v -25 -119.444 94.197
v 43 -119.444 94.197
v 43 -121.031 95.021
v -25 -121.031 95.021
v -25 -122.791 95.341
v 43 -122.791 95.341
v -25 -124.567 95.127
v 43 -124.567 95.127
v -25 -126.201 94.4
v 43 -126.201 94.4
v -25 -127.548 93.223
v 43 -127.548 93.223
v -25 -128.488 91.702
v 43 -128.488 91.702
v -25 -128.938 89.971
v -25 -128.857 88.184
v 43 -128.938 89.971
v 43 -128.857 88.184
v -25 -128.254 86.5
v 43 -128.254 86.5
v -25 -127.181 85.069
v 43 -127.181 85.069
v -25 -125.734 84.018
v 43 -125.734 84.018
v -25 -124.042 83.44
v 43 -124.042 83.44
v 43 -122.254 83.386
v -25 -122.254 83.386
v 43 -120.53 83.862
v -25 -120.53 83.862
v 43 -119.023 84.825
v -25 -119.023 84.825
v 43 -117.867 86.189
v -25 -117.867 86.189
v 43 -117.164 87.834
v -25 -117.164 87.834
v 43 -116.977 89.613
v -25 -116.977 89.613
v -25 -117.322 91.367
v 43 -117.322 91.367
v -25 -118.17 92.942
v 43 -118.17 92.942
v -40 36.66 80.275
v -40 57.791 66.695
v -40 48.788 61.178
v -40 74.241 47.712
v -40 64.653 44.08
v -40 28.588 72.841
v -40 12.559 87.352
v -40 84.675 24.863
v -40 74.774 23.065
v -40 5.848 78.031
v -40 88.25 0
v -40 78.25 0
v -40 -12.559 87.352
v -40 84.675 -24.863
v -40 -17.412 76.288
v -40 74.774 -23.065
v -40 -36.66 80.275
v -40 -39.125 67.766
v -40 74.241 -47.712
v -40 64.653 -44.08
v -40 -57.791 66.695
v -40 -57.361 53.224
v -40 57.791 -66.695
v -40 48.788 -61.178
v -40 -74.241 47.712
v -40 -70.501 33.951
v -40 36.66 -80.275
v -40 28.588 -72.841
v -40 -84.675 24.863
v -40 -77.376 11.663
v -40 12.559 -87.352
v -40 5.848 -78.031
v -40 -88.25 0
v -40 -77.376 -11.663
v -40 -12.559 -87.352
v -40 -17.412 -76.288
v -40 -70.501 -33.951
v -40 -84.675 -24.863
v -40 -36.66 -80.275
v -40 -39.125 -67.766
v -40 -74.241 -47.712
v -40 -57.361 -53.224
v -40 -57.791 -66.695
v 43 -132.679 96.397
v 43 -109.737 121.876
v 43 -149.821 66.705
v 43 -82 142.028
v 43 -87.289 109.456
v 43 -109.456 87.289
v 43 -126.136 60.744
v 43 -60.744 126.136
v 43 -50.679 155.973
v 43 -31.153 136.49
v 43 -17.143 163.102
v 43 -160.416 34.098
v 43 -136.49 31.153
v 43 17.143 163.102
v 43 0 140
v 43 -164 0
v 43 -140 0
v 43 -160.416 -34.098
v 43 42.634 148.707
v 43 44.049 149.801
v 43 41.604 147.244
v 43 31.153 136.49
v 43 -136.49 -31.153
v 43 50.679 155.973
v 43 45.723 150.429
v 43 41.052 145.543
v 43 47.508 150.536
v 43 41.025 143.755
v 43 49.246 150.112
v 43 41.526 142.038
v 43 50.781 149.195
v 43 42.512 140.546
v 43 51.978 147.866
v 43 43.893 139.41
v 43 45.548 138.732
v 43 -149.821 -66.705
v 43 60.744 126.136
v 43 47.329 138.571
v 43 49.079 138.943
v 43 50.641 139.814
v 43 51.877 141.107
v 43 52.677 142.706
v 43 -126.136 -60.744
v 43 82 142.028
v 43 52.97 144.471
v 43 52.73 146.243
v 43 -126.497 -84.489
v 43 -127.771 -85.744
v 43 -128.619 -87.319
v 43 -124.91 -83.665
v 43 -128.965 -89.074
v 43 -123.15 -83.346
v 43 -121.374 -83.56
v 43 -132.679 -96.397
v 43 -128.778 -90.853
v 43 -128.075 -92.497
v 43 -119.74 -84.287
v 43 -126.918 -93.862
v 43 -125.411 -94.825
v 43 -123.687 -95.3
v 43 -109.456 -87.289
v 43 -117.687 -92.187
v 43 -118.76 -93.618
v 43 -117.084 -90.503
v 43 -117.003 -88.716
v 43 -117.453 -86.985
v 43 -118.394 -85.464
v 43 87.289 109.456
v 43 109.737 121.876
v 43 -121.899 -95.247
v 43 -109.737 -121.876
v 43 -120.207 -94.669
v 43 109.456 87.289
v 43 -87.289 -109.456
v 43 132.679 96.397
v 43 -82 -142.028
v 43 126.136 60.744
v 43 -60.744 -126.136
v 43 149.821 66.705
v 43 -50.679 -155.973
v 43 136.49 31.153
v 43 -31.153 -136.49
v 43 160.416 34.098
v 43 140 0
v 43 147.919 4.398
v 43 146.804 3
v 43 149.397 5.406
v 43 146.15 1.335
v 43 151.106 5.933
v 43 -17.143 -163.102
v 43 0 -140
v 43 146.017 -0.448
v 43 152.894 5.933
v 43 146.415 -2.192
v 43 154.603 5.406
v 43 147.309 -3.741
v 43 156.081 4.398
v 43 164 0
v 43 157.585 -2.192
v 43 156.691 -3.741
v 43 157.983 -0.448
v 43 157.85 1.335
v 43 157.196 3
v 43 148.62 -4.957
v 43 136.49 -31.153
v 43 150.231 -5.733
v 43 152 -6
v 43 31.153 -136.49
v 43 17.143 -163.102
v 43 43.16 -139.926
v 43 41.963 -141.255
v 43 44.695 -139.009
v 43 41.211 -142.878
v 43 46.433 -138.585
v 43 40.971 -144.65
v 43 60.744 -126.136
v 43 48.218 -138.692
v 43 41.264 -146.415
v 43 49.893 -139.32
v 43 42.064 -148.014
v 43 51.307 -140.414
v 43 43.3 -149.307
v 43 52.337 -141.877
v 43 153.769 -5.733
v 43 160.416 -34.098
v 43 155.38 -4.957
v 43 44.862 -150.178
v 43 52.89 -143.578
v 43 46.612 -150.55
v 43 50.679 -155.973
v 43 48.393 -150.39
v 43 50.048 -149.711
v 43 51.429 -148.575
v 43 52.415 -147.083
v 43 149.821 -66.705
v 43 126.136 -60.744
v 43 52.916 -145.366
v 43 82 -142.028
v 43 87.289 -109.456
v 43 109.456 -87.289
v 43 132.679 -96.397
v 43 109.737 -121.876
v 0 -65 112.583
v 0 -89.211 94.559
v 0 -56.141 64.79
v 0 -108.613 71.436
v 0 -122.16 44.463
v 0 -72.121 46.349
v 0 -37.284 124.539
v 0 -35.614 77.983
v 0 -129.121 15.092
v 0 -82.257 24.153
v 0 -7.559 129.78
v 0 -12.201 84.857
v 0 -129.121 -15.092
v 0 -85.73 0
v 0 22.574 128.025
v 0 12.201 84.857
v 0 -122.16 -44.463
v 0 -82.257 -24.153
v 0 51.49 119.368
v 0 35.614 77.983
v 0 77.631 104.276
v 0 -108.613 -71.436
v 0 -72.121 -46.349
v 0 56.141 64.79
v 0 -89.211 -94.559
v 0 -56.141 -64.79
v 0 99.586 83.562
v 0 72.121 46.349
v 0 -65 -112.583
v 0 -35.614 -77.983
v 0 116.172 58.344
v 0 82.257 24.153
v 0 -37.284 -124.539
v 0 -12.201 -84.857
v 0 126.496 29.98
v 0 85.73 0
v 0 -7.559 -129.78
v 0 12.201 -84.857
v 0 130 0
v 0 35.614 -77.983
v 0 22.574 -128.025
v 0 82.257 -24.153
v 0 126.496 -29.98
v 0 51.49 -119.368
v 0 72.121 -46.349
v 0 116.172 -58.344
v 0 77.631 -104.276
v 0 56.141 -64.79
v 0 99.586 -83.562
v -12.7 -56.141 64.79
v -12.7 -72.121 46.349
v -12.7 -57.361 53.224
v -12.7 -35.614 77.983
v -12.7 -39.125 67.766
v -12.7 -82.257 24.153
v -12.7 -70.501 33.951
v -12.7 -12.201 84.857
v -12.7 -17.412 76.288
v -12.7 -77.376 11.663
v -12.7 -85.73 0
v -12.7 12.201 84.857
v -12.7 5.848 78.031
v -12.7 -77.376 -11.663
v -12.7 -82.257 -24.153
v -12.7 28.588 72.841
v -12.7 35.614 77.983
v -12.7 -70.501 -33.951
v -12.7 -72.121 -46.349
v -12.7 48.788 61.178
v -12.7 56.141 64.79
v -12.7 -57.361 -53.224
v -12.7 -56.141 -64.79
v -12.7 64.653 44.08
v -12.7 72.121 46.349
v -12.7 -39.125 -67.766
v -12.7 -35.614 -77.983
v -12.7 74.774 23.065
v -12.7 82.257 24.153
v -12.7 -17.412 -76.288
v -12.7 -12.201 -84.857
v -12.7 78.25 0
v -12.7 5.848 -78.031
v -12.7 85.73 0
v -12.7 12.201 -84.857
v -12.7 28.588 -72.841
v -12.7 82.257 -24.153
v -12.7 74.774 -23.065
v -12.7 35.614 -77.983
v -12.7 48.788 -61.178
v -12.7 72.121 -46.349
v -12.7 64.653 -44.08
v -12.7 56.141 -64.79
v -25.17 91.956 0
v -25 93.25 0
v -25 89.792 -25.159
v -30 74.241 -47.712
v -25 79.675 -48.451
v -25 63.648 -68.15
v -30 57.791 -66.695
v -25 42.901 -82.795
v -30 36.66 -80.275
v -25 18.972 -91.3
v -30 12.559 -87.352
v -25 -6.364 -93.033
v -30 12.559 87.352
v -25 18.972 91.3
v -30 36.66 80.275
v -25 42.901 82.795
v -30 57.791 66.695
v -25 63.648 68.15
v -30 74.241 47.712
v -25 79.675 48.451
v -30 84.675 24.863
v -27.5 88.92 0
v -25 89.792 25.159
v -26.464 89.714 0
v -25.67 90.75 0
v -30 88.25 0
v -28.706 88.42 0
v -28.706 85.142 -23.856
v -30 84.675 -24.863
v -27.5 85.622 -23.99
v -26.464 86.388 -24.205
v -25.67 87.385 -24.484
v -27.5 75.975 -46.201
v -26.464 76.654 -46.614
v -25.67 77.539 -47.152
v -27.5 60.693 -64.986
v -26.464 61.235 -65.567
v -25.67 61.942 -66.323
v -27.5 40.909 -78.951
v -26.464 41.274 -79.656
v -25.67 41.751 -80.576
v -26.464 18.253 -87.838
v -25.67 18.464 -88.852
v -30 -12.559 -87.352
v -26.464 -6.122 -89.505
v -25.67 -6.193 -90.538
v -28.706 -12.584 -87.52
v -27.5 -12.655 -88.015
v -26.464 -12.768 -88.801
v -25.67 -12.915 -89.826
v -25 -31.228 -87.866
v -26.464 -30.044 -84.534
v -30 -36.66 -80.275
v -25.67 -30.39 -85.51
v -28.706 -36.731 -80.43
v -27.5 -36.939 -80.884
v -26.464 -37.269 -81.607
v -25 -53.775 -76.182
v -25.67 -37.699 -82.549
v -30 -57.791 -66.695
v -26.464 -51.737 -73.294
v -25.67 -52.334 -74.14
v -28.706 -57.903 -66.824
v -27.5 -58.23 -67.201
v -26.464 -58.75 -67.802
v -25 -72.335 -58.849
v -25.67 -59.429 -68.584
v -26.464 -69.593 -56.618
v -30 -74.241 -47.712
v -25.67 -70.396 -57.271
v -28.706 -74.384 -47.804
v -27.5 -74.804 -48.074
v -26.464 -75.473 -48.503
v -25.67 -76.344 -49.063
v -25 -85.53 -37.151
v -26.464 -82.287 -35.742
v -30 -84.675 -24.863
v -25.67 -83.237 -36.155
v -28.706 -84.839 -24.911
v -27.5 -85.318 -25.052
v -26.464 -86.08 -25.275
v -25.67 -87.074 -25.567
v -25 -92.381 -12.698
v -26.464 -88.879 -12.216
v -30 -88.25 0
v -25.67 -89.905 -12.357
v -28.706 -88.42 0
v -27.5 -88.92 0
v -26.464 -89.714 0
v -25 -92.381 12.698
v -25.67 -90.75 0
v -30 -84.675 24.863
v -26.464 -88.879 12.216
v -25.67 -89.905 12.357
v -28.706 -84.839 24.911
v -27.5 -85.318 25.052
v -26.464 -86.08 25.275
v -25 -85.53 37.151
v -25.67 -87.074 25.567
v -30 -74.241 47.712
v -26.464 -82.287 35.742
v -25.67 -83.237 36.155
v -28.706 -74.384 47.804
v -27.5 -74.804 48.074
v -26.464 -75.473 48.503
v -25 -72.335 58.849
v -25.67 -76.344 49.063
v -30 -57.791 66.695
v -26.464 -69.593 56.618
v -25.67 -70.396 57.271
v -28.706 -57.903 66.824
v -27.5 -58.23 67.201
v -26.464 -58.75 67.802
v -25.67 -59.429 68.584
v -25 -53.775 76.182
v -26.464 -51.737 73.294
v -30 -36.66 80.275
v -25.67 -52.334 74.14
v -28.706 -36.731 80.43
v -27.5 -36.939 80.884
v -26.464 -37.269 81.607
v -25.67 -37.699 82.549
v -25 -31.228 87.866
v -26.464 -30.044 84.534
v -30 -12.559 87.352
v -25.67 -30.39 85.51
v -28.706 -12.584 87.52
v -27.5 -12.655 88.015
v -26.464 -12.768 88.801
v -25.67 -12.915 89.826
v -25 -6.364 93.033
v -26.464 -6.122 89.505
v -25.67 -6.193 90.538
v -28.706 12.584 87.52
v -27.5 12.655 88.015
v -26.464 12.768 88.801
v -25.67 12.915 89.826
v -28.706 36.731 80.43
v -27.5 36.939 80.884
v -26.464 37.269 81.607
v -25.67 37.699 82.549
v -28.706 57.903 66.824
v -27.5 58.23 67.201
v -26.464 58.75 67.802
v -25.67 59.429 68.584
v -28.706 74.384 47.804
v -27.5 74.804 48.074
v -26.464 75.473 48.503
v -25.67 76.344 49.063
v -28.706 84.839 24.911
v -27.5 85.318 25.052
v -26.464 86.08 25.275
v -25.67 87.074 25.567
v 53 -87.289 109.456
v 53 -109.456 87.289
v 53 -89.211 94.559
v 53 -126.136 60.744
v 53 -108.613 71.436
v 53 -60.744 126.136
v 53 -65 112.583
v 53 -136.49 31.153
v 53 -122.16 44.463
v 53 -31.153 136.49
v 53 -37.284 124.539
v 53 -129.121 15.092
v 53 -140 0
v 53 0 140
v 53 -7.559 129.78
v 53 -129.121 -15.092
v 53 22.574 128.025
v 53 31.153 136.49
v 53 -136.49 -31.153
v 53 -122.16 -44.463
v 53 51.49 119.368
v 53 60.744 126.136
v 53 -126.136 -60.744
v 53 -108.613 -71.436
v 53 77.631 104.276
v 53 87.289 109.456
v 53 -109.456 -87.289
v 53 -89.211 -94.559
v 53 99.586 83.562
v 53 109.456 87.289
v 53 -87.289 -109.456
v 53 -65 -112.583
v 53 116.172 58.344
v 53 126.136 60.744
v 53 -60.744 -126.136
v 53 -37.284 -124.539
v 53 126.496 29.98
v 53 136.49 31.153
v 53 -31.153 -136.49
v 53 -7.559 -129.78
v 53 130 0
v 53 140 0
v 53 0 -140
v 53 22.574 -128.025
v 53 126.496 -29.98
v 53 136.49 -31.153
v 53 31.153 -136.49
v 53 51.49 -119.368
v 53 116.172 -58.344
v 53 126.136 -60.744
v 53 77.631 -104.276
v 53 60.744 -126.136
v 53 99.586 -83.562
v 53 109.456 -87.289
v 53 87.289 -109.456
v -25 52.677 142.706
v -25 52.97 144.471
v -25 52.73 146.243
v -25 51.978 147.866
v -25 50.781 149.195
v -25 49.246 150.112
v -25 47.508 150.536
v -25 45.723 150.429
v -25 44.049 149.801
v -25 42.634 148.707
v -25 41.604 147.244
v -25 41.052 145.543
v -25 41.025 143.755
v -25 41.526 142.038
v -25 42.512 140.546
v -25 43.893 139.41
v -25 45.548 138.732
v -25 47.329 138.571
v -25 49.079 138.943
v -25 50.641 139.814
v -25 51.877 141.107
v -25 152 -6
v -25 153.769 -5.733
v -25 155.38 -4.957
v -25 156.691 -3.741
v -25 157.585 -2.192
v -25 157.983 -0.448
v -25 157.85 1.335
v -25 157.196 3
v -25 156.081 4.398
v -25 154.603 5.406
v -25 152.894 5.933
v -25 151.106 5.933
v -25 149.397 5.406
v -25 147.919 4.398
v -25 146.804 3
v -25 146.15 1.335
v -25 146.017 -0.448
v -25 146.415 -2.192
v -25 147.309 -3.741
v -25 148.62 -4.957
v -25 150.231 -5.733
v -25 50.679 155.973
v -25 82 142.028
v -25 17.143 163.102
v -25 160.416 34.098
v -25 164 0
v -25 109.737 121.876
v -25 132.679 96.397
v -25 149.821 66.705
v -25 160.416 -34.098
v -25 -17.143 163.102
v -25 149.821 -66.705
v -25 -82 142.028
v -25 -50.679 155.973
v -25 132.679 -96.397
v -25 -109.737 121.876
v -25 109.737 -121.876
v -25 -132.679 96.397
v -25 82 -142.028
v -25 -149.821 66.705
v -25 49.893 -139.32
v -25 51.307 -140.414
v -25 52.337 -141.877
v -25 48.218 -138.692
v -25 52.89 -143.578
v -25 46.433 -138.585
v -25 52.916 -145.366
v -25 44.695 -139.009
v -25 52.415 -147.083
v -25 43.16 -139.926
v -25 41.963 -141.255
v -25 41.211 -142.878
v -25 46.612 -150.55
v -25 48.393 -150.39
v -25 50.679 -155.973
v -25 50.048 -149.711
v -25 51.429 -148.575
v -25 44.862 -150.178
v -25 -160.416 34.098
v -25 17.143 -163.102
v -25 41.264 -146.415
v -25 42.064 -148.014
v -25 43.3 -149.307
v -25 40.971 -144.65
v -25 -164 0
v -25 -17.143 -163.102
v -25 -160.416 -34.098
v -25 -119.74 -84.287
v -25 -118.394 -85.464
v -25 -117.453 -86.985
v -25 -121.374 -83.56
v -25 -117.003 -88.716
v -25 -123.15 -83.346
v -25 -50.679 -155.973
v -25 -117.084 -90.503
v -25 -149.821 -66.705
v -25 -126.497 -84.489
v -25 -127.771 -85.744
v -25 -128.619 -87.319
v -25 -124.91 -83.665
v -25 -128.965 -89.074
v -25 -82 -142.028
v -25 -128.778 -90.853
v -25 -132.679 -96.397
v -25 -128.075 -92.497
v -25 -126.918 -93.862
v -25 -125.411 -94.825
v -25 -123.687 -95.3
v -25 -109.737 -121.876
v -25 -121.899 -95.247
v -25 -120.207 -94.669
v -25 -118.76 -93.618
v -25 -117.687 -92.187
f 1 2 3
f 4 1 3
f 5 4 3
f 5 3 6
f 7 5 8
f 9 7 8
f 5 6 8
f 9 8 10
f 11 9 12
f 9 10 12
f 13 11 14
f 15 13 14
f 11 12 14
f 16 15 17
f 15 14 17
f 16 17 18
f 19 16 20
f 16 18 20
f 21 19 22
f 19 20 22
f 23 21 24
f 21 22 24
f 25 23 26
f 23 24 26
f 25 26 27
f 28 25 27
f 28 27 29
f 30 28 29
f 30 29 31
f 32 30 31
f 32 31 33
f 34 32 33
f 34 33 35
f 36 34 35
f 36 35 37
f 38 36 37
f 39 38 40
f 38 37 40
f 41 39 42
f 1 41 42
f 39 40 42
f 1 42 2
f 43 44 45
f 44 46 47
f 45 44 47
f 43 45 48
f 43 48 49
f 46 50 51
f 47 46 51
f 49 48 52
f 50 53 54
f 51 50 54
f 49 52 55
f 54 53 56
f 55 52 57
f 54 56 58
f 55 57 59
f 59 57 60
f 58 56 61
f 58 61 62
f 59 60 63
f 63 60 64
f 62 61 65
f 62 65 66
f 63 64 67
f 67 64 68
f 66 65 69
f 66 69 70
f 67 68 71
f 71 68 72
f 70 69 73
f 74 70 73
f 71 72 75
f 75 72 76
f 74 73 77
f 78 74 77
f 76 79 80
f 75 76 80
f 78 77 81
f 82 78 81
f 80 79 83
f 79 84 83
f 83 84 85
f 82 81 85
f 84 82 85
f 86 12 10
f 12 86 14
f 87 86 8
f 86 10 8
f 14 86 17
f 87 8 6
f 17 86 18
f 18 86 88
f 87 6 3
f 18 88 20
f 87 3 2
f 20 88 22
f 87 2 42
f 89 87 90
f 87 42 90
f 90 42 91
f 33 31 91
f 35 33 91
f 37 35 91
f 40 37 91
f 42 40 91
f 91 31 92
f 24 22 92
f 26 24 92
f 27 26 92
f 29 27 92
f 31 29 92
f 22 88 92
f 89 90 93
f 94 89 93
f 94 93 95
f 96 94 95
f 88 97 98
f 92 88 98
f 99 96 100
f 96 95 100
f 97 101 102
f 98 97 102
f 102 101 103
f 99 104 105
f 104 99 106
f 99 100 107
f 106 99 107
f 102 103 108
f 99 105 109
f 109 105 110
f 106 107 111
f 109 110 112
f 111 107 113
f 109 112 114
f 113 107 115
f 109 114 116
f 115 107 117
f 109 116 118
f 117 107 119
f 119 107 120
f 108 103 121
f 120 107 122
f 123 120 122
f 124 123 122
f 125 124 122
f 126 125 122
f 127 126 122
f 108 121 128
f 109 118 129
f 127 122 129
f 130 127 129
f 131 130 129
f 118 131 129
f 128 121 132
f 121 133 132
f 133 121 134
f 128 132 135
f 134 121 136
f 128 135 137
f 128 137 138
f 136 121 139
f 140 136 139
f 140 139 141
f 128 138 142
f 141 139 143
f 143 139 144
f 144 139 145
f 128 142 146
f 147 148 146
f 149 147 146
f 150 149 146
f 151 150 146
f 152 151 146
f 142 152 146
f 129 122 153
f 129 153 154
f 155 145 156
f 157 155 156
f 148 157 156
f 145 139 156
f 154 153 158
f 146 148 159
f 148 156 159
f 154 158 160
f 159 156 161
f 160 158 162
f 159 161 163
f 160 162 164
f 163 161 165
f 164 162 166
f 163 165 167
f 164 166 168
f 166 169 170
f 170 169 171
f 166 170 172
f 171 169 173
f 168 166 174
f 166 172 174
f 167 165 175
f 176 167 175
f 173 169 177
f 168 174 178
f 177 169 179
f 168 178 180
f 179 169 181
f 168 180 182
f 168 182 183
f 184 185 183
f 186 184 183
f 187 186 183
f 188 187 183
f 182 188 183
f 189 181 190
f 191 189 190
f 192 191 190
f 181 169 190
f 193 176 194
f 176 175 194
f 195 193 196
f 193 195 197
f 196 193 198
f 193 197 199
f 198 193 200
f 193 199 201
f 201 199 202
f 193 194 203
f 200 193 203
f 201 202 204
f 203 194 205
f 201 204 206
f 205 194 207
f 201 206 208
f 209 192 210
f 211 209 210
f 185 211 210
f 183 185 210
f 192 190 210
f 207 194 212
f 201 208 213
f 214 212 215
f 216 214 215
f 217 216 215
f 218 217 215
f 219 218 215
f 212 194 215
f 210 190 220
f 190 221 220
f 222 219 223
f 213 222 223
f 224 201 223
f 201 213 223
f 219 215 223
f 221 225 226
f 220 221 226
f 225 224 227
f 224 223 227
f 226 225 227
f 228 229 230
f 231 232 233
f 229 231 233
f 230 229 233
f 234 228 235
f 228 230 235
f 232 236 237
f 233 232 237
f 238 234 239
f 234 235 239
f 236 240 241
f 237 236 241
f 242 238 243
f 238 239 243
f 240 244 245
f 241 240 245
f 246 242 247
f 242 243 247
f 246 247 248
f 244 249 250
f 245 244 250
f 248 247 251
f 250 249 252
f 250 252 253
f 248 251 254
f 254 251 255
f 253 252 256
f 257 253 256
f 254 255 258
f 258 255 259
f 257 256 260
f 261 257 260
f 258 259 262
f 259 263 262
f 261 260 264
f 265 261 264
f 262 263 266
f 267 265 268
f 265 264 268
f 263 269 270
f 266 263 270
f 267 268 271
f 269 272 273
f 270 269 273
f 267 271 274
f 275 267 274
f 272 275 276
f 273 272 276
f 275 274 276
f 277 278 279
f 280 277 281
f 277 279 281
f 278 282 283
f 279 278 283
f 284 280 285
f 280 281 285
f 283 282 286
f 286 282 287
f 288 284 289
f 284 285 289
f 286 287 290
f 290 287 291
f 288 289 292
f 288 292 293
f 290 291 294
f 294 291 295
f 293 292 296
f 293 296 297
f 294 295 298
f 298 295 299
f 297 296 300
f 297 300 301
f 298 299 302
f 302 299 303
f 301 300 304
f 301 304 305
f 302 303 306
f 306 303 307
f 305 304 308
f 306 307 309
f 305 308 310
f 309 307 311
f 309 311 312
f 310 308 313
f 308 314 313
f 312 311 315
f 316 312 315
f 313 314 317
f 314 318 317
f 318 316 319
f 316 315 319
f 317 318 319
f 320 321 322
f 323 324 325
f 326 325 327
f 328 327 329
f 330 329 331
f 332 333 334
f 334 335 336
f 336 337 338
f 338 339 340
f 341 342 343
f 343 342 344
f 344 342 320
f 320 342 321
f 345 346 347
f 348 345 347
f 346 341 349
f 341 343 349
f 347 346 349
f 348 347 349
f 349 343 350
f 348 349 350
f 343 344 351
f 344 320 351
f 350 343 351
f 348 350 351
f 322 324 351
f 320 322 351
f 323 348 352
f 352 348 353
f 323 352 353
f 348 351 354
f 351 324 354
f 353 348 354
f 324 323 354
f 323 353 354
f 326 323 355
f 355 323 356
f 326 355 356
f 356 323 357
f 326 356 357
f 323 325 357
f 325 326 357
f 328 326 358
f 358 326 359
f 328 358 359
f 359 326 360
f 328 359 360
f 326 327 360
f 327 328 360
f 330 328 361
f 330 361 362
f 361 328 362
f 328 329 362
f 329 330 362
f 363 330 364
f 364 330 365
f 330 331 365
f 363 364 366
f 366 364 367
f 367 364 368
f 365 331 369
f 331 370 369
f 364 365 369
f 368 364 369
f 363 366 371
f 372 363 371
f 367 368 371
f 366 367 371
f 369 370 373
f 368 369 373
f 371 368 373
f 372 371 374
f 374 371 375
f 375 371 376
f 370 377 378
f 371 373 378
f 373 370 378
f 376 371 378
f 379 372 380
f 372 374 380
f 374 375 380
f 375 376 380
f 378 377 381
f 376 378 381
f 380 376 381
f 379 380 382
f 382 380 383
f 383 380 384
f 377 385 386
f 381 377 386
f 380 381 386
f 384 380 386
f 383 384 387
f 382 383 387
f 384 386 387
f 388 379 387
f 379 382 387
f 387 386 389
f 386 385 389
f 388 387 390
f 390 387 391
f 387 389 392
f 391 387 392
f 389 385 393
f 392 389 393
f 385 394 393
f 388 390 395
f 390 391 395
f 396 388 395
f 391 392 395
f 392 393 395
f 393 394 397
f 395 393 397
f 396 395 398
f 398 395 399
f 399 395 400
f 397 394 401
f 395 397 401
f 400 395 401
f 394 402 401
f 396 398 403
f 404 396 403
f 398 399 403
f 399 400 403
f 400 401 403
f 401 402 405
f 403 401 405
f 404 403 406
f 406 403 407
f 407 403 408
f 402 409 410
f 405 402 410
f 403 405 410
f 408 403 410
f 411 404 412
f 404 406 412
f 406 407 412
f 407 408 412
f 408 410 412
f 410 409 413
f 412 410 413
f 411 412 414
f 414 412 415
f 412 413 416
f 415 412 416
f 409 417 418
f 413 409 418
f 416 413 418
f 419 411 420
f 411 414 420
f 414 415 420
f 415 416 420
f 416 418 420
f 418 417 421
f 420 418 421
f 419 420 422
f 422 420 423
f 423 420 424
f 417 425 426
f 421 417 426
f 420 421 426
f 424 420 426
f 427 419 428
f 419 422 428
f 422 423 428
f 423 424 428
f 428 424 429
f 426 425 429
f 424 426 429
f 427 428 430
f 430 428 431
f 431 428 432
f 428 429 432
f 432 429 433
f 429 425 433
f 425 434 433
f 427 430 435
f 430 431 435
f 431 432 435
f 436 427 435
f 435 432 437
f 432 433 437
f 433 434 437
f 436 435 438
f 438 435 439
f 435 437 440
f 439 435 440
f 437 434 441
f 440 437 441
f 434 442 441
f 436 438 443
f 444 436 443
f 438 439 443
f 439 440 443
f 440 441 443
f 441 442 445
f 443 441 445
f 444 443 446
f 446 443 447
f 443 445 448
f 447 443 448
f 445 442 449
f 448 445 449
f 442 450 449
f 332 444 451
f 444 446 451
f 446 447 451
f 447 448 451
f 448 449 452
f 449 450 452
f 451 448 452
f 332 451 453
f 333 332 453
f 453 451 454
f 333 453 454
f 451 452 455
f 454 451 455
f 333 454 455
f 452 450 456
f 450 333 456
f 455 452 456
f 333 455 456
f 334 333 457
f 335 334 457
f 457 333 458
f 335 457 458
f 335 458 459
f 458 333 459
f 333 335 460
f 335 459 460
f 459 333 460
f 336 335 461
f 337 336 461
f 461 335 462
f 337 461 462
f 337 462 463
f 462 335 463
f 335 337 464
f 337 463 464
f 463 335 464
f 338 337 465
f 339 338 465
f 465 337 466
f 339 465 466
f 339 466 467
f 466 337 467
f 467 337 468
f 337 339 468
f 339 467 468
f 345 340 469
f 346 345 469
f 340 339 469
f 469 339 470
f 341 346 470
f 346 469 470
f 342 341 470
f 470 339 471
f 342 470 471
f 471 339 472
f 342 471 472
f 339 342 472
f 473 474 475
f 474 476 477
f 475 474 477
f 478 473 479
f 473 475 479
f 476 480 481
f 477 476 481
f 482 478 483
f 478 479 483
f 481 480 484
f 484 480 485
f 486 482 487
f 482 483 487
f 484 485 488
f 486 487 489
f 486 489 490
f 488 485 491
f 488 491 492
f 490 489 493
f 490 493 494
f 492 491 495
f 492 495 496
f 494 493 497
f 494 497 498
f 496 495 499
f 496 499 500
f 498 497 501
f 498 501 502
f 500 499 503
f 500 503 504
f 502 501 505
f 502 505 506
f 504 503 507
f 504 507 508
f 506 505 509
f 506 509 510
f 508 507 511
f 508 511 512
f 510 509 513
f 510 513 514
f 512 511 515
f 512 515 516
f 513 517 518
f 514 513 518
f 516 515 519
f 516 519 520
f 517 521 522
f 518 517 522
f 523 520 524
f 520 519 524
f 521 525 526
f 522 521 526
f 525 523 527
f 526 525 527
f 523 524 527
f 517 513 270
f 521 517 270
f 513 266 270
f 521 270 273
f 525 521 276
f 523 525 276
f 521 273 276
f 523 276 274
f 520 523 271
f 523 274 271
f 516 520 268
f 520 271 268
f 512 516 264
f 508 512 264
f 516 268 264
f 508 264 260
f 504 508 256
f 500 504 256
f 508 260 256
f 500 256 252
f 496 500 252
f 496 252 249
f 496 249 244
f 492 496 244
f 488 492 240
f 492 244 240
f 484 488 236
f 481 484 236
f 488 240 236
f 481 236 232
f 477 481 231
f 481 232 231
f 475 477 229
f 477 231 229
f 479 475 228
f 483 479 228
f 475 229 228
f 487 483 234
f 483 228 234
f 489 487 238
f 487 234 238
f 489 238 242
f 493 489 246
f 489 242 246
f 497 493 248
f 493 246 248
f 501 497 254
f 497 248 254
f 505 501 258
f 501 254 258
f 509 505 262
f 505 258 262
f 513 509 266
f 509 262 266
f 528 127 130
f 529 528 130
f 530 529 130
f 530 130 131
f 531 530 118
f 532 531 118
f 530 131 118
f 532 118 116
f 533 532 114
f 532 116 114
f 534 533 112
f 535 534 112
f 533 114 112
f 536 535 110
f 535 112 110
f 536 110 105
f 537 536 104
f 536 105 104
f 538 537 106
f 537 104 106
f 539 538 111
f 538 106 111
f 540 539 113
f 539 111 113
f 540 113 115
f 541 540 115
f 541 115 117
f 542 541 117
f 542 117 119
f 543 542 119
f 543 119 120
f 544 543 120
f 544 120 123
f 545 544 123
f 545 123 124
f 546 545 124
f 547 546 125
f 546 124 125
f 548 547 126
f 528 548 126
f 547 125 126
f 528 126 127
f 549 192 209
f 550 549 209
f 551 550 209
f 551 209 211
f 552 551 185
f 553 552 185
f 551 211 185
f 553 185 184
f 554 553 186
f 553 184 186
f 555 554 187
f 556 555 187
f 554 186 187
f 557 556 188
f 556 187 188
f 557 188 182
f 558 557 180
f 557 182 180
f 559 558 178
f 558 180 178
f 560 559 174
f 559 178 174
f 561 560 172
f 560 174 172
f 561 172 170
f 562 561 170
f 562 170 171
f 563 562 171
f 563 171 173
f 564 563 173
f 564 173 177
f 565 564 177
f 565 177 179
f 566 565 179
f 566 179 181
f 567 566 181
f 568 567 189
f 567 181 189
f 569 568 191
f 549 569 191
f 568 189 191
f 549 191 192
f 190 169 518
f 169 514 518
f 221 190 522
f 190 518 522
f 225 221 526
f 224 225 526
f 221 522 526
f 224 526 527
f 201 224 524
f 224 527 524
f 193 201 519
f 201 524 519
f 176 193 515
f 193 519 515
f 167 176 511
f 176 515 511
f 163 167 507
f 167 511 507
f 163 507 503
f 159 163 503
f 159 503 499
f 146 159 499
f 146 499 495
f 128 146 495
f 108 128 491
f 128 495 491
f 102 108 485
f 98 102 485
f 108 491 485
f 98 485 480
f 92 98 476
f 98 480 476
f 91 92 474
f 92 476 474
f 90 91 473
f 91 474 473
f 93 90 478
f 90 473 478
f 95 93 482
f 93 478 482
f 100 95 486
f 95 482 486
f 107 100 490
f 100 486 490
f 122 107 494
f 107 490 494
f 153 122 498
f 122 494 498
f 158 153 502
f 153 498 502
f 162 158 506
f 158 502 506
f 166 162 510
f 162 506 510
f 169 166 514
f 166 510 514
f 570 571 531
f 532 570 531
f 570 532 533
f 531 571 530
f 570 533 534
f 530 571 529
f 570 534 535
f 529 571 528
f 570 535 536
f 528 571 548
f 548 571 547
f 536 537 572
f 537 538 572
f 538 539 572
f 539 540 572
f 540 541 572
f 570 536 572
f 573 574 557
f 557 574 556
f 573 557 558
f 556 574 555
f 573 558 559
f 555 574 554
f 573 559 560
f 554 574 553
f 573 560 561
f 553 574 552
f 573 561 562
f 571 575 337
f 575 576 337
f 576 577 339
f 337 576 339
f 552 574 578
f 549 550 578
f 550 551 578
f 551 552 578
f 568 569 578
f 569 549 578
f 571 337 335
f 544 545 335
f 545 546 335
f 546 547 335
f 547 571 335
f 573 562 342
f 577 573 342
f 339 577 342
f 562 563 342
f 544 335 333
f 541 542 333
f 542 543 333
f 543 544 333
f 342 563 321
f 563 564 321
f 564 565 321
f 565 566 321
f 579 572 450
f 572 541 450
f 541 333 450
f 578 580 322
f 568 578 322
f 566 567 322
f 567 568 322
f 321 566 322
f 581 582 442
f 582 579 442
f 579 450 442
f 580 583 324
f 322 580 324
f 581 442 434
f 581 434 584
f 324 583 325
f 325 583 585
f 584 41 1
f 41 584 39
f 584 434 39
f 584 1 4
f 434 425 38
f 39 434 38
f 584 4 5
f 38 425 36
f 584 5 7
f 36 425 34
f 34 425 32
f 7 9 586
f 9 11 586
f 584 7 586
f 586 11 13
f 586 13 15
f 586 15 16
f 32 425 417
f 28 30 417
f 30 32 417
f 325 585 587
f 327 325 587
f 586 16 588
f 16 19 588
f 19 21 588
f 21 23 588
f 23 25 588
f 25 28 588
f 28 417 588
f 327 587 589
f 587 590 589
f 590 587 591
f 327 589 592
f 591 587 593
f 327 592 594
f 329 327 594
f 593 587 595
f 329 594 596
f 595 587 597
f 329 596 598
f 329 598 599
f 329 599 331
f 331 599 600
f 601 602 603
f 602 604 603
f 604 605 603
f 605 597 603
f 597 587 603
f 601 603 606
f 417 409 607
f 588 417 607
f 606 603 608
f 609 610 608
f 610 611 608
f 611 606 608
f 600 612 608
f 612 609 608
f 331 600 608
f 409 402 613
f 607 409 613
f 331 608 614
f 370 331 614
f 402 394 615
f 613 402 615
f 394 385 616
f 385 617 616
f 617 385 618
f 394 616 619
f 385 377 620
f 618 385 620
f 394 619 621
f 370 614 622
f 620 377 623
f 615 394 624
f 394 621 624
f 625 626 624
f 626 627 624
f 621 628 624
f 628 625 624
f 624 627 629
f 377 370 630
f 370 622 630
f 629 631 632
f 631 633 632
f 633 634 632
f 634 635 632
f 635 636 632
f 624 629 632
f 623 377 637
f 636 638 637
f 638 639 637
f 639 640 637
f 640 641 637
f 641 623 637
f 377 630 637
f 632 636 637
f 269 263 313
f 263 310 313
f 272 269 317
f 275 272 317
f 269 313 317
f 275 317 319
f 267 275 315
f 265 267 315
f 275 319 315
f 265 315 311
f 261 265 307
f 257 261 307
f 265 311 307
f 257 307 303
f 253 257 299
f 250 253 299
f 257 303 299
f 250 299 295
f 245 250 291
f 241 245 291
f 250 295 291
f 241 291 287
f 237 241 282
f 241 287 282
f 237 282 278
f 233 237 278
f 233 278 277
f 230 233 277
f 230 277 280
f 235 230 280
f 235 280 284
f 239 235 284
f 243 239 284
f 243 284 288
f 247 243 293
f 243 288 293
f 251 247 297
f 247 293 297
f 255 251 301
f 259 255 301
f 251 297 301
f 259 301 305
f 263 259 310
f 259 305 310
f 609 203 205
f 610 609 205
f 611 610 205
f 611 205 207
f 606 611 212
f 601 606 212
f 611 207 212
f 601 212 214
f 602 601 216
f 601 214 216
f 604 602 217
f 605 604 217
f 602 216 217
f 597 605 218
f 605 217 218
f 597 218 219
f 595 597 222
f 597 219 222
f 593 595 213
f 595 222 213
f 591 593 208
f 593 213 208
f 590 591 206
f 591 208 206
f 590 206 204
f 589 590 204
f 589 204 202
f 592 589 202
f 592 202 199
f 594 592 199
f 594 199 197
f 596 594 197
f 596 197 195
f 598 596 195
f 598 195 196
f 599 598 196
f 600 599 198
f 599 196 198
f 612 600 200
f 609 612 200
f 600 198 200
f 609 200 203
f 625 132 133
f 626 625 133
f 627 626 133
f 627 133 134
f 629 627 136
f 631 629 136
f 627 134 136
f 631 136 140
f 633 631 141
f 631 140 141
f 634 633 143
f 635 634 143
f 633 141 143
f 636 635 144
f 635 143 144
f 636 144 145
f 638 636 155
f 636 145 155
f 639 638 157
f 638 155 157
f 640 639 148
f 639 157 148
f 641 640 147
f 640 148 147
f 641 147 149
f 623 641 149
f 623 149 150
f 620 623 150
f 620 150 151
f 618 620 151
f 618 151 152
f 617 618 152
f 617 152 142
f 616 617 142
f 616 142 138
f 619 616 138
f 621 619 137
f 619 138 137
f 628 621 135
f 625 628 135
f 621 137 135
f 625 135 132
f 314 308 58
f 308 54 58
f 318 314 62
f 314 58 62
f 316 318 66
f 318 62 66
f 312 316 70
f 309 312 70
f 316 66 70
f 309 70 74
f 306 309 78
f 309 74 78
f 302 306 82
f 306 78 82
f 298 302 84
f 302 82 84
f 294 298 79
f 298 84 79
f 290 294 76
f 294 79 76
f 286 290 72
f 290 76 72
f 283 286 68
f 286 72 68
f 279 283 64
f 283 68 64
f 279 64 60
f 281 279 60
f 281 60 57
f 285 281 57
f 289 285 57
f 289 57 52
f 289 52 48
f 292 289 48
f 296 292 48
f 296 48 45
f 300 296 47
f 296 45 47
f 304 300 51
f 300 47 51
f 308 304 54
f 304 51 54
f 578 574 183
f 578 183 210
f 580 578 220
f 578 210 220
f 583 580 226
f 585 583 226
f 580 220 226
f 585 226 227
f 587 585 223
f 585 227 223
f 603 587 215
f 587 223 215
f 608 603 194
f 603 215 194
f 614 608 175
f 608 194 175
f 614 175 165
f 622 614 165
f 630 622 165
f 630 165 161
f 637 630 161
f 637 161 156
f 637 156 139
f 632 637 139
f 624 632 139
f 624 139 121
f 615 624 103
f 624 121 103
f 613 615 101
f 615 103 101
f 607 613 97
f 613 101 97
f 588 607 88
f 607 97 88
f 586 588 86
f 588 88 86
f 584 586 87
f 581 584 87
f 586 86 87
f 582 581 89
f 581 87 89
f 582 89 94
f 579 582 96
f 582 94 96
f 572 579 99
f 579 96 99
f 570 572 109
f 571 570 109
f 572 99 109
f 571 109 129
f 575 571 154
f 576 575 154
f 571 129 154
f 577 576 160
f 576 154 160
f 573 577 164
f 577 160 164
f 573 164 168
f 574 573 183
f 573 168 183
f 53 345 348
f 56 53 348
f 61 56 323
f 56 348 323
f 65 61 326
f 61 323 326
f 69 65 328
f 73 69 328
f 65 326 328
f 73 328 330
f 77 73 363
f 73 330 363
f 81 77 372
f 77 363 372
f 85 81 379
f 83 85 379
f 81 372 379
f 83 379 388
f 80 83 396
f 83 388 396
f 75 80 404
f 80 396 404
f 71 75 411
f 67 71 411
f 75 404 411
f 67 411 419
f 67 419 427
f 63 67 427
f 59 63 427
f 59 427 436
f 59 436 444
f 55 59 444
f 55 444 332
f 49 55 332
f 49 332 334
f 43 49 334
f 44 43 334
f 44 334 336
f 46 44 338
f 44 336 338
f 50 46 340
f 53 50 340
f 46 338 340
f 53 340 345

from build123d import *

# Parameters (mm, degrees)
FILLET3_R          = 5
SKETCH2_R          = 6
CUT_EXTRUDE1_DEPTH = 68
CIRPATTERN1_COUNT  = 5


with BuildPart() as part:
    # Sketch1 → Revolve1 (revolve)
    with BuildSketch(Plane.XY):
        Polygon((0, 130), (0, 85.73), (-12.7, 85.73), (-12.7, 78.25), (-40, 78.25), (-40, 88.25), (-25, 88.25), (-25, 164), (43, 164), (43, 140), (53, 140), (53, 130), align=None)
    revolve(axis=Axis((100.288511214, 0, 0), (-1, 0, 0)))

    # Fillet3
    fillet3_edges = [part.edges().sort_by_distance(p)[0] for p in [
        (-25, -88.25, 0),
    ]]
    fillet(fillet3_edges, radius=FILLET3_R)

    # Sketch2 → Cut-Extrude1 (cut)
    with BuildSketch(Plane(origin=(43, 0, 0), x_dir=(0, 0, -1), z_dir=(1, 0, 0))):
        with Locations((0, 152)):
            Circle(SKETCH2_R)
    cut_extrude1 = extrude(amount=-CUT_EXTRUDE1_DEPTH, mode=Mode.SUBTRACT)

    # CirPattern1: Cut-Extrude1 ×5 about axis
    cirpattern1_axis = Axis((0, 0, 0), (1, 0, 0))
    for i in range(1, CIRPATTERN1_COUNT):
        add(cut_extrude1.rotate(cirpattern1_axis, i * 360 / CIRPATTERN1_COUNT), mode=Mode.SUBTRACT)


solid = part.part
